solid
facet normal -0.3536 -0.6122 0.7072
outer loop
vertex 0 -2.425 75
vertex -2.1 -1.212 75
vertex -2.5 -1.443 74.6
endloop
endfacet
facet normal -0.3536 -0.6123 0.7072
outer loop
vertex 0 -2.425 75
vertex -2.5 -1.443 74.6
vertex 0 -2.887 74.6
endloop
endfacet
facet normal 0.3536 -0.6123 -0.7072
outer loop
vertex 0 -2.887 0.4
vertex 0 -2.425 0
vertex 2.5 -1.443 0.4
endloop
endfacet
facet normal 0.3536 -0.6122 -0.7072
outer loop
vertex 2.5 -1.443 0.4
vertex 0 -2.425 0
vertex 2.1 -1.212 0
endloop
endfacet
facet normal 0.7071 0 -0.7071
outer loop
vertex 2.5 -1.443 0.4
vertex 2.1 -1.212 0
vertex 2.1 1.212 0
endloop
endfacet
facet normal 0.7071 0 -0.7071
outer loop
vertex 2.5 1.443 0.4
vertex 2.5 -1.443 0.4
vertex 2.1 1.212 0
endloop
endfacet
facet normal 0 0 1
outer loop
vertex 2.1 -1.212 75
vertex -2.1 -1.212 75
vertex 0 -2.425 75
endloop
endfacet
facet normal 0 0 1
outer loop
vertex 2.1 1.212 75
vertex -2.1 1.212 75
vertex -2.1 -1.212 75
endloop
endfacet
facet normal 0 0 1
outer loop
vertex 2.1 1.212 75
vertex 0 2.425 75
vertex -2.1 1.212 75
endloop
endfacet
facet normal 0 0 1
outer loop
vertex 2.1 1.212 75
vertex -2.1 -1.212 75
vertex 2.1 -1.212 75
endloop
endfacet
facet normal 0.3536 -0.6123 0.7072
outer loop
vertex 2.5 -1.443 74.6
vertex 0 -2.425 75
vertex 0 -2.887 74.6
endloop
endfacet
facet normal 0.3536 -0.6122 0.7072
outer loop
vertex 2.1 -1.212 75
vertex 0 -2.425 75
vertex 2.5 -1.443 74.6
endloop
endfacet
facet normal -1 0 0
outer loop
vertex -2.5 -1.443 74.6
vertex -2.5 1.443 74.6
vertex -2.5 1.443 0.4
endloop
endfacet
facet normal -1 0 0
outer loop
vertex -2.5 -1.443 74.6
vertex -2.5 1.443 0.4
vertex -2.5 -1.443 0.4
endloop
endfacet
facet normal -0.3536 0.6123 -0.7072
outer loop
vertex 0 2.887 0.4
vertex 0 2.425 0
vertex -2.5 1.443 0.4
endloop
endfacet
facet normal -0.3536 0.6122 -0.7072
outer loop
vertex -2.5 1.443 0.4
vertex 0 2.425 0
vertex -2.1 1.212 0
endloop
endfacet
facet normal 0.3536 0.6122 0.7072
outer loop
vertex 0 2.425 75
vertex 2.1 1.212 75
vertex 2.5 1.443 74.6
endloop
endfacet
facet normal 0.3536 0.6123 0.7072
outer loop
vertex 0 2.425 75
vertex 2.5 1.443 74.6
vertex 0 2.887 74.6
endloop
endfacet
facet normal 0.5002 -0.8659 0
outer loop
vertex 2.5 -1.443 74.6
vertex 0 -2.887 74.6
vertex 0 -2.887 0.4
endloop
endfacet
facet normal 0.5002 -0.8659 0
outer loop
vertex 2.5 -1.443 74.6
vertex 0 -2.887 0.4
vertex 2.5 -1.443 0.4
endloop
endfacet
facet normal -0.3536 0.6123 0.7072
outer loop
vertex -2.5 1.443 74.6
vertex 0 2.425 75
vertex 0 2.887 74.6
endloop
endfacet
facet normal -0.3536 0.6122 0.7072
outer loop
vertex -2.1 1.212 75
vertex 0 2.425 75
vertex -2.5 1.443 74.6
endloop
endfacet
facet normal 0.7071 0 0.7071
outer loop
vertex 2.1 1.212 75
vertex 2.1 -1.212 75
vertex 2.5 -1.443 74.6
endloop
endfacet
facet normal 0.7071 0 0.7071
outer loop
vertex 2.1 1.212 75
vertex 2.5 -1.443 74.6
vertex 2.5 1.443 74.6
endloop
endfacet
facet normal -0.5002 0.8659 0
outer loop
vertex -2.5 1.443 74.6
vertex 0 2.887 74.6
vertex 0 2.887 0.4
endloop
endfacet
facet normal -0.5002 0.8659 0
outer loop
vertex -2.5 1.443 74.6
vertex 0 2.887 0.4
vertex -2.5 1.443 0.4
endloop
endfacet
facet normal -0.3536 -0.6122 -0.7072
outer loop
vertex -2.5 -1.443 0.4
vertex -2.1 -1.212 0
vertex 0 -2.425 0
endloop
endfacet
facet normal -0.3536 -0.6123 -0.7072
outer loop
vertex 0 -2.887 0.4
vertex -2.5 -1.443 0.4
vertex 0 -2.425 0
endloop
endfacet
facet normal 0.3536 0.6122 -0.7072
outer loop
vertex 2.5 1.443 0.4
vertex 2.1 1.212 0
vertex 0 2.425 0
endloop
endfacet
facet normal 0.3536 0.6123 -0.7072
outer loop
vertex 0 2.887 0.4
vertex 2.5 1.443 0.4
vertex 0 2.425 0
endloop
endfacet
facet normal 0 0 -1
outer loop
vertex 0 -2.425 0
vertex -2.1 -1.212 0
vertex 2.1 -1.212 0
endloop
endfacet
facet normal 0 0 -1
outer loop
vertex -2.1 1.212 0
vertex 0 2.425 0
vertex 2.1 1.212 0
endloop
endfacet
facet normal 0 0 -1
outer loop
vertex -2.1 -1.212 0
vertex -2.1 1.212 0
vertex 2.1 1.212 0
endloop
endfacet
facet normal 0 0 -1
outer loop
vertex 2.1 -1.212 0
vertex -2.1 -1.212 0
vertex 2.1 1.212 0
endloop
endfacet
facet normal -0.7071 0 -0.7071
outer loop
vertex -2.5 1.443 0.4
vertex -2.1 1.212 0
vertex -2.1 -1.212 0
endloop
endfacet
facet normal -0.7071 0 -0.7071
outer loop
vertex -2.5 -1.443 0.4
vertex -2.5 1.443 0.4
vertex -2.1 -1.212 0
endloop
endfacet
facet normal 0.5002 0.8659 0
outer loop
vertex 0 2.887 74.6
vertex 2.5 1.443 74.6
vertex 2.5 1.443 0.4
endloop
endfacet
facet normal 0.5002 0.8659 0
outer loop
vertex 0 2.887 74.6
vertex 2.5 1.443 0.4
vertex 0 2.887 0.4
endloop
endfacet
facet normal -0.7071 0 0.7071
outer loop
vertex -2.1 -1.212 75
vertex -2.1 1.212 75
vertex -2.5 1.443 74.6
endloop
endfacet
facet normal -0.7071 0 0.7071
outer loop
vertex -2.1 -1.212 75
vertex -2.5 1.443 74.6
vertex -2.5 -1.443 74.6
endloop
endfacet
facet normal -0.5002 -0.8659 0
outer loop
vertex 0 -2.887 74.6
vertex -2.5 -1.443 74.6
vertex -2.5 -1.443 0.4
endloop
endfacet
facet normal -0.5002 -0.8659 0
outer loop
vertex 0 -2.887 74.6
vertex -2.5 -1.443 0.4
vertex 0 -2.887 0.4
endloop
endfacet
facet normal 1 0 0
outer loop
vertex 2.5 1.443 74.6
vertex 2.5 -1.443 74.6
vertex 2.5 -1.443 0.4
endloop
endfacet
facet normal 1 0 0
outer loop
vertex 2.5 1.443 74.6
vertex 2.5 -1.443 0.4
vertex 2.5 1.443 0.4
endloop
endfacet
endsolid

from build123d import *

# Parameters (mm, degrees)
BOSS_EXTRUDE1_DEPTH = 75
CHAMFER1_SIZE       = 0.4


with BuildPart() as part:
    # Sketch1 → Boss-Extrude1 (new body)
    with BuildSketch(Plane.XY.offset(75)):
        Polygon((0, -2.886751346), (2.5, -1.443375673), (2.5, 1.443375673), (0, 2.886751346), (-2.5, 1.443375673), (-2.5, -1.443375673), align=None)
    extrude(amount=-BOSS_EXTRUDE1_DEPTH)

    # Chamfer1
    chamfer1_edges = [part.edges().sort_by_distance(p)[0] for p in [
        (2.5, 0, 0),
        (1.25, 2.165063509, 0),
        (-1.25, 2.165063509, 0),
        (-2.5, 0, 0),
        (-1.25, -2.165063509, 0),
        (-2.5, 0, 75),
        (-1.25, 2.165063509, 75),
        (1.25, 2.165063509, 75),
        (1.25, -2.165063509, 0),
        (2.5, 0, 75),
        (1.25, -2.165063509, 75),
        (-1.25, -2.165063509, 75),
    ]]
    chamfer(chamfer1_edges, length=CHAMFER1_SIZE)


solid = part.part
